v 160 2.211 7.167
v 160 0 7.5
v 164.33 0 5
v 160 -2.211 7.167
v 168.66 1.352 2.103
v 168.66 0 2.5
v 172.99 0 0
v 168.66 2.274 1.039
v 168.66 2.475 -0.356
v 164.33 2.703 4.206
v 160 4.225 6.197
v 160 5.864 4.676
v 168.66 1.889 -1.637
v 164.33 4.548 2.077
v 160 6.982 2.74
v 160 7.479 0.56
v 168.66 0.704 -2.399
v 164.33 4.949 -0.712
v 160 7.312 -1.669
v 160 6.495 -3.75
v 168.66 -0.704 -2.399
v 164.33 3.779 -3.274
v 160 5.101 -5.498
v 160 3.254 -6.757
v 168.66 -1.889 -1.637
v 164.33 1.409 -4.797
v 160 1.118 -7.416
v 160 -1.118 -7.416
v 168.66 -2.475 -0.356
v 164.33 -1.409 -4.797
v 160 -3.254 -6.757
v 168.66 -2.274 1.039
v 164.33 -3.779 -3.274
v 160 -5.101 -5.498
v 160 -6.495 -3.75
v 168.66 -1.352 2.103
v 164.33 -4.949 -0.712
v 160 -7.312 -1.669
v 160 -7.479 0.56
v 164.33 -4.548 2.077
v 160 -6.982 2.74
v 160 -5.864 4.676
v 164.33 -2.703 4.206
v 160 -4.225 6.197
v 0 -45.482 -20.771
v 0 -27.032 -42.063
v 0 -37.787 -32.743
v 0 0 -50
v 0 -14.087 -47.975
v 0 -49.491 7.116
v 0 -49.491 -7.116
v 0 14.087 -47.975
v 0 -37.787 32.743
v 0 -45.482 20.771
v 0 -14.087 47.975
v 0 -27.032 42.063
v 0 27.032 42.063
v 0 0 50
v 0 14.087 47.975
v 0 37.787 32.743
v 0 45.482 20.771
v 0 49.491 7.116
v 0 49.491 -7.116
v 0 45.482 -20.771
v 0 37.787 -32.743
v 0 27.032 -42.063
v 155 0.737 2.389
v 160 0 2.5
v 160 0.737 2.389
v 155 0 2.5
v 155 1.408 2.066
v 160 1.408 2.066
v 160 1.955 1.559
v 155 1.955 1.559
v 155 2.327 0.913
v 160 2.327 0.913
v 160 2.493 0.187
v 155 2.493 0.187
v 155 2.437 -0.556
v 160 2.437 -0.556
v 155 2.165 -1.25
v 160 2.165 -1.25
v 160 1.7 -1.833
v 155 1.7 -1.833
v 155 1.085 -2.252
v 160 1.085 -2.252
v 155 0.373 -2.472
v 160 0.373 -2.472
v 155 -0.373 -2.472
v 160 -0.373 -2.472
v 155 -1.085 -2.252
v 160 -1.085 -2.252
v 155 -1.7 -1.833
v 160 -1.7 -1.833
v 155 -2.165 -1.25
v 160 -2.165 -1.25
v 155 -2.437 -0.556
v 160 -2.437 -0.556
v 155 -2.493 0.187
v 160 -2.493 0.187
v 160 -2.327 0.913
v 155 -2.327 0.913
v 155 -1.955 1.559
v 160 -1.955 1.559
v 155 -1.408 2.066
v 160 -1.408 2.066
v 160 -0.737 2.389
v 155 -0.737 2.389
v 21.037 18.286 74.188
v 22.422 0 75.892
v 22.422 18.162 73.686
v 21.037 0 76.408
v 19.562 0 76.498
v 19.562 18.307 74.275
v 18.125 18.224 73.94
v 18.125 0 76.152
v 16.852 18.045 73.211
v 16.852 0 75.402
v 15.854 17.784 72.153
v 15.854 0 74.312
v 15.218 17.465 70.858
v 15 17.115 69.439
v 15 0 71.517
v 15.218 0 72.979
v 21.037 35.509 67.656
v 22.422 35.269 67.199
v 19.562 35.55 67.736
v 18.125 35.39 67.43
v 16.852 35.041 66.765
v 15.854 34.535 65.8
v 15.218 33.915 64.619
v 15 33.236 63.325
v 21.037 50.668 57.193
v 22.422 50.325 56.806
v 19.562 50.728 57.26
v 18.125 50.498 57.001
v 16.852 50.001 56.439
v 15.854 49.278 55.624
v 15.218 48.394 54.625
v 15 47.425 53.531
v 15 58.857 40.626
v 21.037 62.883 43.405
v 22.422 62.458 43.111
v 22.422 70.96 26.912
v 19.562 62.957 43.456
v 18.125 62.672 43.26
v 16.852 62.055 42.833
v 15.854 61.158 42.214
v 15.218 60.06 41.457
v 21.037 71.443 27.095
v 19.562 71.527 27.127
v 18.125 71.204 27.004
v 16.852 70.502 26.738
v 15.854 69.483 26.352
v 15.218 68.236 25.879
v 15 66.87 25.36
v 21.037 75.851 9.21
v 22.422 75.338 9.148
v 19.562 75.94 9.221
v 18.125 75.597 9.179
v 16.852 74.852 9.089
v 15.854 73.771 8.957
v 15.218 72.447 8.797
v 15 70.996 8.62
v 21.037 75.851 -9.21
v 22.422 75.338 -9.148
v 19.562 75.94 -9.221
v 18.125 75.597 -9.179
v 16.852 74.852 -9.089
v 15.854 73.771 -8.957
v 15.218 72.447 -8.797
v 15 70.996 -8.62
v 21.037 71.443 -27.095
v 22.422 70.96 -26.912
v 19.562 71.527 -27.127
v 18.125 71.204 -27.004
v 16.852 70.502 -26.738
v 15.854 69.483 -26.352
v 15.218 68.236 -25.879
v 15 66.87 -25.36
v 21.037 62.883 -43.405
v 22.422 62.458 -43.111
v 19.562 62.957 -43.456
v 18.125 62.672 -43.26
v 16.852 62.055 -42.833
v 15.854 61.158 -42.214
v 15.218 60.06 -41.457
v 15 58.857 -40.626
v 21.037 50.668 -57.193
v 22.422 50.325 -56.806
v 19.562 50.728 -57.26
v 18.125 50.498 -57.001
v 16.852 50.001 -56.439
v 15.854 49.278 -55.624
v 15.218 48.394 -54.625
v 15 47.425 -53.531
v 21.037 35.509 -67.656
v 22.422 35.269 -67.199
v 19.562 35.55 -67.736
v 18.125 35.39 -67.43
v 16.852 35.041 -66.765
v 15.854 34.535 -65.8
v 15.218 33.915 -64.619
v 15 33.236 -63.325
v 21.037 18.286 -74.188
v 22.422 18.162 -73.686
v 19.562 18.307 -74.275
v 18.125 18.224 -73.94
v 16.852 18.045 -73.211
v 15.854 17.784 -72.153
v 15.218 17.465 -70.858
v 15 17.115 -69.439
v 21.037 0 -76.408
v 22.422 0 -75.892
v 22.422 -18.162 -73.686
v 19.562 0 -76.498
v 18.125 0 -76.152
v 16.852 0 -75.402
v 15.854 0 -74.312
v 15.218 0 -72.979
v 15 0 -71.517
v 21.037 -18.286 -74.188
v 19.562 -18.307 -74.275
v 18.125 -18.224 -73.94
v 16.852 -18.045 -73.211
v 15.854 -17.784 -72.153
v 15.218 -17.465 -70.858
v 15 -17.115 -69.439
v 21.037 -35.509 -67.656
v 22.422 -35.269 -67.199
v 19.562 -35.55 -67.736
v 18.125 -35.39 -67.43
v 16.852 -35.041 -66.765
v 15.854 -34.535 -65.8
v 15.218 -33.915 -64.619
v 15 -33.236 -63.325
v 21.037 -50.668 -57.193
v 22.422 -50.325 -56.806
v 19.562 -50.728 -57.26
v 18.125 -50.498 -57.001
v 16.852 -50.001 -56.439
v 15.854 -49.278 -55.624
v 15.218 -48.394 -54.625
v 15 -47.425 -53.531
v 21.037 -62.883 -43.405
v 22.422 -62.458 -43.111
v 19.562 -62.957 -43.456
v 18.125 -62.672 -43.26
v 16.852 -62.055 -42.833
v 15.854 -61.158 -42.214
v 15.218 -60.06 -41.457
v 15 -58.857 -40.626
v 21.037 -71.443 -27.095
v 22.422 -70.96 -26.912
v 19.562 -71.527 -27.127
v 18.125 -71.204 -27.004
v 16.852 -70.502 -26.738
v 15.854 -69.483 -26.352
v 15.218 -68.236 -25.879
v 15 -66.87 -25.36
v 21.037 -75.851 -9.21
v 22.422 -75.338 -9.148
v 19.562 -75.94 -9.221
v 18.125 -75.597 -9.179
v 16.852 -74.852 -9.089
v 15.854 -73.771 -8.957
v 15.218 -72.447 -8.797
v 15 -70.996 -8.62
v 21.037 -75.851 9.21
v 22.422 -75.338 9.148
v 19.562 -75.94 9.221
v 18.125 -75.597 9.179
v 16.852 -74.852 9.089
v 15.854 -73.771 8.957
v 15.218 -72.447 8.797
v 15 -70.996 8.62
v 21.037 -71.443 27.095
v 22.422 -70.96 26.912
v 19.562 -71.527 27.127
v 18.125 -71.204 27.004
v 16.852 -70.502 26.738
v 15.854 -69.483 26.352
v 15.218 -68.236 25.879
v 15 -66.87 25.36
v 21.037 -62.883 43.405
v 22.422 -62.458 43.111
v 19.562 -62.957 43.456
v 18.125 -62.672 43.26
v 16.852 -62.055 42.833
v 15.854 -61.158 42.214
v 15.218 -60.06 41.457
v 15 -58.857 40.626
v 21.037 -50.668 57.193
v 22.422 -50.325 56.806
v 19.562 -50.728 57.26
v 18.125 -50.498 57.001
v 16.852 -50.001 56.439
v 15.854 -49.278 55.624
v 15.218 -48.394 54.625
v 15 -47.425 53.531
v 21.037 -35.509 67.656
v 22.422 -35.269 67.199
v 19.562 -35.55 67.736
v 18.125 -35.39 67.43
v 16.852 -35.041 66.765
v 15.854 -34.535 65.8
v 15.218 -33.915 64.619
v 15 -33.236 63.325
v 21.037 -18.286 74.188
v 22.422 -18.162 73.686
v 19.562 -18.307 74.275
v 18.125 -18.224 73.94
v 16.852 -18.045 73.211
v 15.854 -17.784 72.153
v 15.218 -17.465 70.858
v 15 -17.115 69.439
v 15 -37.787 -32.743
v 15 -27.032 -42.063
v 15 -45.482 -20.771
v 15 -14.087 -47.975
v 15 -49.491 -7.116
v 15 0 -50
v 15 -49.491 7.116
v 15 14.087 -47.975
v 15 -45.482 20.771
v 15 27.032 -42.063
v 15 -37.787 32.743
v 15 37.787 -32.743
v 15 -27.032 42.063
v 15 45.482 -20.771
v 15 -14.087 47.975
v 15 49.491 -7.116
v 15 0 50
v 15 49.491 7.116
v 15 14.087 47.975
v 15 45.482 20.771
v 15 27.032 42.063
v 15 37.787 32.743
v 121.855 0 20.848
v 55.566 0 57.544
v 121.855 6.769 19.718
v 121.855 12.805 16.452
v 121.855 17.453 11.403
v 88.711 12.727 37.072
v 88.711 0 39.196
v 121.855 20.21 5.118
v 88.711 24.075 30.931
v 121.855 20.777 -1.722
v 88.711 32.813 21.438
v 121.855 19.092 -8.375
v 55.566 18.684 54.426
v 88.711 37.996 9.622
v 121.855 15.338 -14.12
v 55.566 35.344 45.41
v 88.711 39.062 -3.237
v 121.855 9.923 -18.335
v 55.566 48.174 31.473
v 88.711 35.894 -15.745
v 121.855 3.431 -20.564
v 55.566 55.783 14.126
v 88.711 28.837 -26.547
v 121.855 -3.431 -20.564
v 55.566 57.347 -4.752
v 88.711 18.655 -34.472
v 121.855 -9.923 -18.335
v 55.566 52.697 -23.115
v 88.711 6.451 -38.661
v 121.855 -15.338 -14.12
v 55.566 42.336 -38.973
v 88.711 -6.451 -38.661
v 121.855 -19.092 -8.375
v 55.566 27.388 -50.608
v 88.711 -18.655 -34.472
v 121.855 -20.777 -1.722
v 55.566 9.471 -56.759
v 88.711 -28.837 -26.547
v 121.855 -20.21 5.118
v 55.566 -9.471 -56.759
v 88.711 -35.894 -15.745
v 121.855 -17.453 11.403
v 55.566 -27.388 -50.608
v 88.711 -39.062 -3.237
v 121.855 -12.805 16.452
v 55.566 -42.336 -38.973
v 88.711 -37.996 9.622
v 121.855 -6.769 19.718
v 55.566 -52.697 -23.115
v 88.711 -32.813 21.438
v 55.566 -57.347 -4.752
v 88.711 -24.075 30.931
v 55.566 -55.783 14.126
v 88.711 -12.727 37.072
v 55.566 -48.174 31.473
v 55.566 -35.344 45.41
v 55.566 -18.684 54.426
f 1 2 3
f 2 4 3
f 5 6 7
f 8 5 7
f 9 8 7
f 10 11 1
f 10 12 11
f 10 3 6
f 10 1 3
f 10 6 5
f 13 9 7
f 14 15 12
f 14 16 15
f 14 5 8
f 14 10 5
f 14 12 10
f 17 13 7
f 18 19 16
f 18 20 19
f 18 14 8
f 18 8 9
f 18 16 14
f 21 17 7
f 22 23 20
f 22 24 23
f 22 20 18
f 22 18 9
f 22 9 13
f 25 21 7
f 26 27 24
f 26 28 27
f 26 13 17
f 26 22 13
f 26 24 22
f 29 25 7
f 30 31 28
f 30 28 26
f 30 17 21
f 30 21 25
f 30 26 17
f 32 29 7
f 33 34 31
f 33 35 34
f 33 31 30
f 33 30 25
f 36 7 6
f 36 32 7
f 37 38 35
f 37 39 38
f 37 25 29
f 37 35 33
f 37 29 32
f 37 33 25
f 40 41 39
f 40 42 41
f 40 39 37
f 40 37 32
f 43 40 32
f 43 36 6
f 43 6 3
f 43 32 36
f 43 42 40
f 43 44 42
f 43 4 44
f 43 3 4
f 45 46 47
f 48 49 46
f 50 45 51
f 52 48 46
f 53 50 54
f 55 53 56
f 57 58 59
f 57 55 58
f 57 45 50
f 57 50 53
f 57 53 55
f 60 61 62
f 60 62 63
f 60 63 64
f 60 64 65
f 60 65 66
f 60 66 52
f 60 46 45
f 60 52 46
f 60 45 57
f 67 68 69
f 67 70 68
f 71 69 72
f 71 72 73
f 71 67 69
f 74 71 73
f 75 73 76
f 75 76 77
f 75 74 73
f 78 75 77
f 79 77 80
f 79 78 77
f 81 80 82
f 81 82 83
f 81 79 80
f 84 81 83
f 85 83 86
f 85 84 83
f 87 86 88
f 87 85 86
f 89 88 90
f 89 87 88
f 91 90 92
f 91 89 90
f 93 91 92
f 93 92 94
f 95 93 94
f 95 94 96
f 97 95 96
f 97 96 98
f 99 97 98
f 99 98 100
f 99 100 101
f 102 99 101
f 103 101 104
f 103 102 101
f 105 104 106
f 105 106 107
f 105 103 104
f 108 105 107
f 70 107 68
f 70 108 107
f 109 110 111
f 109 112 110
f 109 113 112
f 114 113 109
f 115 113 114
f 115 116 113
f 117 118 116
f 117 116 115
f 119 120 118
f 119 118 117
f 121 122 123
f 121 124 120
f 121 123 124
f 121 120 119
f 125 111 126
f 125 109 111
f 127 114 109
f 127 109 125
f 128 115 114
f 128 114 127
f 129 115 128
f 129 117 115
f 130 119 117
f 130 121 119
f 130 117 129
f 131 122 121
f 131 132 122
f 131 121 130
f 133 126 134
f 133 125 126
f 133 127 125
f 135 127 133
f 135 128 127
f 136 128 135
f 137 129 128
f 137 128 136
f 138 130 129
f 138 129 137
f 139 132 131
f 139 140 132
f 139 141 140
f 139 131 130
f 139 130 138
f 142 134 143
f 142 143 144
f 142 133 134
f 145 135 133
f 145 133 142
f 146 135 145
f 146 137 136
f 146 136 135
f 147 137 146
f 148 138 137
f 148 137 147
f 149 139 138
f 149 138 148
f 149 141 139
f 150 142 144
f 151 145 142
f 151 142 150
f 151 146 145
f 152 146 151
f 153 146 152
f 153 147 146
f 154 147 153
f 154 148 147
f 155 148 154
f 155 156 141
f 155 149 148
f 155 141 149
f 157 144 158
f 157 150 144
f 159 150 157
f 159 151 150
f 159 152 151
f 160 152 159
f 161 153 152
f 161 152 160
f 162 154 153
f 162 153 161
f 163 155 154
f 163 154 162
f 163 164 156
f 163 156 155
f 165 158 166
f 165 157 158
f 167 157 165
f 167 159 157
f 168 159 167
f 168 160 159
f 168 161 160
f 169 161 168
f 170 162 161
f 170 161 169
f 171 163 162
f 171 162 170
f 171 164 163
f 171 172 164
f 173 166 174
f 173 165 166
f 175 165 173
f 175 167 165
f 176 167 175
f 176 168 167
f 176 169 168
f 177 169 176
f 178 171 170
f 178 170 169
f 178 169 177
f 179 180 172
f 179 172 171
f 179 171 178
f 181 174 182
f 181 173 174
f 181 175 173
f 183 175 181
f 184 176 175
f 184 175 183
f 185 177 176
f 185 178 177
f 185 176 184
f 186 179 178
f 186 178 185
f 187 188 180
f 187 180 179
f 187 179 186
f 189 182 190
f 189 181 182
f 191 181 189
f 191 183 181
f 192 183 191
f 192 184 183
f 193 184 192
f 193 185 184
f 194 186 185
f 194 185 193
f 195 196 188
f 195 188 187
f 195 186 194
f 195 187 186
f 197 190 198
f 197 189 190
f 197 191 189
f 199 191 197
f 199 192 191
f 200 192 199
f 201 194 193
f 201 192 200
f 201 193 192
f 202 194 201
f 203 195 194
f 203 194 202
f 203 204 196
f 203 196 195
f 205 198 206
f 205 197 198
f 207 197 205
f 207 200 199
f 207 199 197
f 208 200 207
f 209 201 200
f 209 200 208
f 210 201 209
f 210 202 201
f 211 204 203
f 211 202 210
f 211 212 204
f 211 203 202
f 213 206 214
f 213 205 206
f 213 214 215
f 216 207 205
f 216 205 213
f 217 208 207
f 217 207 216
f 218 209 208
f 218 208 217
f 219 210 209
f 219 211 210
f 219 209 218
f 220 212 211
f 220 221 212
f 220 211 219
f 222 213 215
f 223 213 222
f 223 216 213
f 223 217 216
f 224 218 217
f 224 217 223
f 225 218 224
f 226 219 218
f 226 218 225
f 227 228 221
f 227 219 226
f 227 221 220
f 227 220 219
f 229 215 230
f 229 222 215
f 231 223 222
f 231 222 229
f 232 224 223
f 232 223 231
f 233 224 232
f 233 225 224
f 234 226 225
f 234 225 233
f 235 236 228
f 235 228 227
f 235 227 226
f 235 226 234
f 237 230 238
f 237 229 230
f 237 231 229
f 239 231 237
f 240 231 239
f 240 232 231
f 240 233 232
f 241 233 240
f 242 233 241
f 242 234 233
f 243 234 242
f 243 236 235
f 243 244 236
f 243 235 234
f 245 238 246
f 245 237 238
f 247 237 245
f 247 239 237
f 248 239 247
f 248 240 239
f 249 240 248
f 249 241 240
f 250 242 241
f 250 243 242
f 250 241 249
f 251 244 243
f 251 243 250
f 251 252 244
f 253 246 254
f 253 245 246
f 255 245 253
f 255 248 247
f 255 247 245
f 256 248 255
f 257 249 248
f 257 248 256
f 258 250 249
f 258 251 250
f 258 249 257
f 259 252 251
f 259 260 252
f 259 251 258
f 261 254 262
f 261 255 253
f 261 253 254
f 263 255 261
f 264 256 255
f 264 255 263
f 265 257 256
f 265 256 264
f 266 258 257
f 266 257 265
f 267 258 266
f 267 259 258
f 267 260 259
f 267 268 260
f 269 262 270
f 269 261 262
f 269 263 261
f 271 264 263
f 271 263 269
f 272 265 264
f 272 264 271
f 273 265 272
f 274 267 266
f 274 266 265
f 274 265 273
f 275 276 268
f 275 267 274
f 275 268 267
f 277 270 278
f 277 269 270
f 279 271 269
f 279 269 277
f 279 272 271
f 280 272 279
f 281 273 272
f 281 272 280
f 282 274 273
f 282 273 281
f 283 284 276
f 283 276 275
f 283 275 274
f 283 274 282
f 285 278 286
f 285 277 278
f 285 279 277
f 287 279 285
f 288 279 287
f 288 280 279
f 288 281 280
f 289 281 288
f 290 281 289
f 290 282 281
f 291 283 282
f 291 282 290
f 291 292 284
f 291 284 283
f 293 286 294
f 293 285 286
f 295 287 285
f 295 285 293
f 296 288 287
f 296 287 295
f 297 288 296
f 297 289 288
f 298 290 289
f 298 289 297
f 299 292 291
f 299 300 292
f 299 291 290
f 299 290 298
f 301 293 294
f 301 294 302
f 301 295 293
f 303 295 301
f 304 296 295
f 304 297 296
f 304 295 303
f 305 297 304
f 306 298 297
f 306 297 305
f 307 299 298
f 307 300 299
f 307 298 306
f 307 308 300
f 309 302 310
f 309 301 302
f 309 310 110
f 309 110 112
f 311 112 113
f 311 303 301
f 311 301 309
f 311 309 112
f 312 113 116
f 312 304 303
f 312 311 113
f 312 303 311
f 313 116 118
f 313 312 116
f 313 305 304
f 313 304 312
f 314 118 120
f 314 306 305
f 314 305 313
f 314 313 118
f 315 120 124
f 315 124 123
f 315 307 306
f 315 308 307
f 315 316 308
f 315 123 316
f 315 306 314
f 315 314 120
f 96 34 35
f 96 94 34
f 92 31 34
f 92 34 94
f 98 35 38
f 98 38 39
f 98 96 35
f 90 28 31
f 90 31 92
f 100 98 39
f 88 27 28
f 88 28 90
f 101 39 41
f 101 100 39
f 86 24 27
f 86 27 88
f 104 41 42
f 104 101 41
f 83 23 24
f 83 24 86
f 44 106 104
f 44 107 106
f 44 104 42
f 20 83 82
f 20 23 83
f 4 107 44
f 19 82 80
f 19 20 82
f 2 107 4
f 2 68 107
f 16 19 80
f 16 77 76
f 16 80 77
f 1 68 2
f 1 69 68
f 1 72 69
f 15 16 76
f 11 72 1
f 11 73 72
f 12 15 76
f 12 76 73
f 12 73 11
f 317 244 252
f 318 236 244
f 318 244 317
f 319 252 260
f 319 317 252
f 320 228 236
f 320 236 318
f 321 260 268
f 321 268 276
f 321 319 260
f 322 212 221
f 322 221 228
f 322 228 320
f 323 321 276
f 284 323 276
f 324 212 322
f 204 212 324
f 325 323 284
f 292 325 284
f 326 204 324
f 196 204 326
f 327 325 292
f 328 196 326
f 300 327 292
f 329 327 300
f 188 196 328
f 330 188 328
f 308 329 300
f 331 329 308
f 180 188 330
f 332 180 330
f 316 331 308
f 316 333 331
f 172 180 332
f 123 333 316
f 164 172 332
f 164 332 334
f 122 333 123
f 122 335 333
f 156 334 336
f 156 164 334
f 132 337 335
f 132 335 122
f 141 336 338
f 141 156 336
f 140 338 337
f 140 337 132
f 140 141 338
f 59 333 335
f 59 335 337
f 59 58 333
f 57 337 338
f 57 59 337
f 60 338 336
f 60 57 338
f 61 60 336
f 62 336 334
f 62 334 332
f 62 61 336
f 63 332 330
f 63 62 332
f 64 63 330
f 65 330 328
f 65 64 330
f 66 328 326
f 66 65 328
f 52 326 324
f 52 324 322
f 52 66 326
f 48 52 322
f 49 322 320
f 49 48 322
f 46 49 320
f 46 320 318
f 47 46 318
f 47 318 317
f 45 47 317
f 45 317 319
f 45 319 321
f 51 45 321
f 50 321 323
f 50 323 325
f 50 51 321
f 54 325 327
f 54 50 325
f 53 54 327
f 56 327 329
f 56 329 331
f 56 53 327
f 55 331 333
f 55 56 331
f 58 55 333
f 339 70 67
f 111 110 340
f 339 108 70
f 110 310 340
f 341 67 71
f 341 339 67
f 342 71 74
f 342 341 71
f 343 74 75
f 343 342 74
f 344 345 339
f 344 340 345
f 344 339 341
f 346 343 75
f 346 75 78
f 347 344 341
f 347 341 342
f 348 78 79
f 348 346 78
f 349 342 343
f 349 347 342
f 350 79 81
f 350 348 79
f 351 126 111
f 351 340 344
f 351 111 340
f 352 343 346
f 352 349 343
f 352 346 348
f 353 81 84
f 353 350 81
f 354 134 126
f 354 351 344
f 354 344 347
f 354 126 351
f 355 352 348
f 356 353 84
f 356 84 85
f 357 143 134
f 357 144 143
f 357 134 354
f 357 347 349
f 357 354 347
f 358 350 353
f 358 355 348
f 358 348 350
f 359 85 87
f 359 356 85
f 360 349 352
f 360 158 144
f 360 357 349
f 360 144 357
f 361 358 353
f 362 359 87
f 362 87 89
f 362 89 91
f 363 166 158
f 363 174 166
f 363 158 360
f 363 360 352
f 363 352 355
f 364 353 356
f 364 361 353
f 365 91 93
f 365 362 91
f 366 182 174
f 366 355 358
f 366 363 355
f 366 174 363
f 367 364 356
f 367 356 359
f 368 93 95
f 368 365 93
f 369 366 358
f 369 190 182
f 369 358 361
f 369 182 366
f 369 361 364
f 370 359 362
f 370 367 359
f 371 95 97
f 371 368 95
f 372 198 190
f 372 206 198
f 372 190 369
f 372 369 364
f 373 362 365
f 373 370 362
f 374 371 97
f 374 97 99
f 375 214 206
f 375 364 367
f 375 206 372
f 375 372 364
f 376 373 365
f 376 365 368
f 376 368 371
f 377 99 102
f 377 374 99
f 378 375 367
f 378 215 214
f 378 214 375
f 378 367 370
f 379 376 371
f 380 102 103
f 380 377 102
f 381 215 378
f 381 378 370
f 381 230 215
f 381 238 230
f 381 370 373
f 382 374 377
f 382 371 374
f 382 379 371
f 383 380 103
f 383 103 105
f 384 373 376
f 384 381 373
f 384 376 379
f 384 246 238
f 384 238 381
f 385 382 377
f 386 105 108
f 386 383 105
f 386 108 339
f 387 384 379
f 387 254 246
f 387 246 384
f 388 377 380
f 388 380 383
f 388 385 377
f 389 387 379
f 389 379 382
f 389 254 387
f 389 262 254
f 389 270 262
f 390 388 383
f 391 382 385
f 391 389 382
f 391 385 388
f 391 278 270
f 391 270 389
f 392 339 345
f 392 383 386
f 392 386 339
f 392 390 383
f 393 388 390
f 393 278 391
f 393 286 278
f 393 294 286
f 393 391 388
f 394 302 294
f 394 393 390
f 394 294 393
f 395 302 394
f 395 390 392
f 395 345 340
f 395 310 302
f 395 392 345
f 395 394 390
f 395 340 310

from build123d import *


with BuildPart() as f1:
    # F0 (on Front) → F1 (revolve)
    with BuildSketch(Plane.XZ):
        with BuildLine():
            Line((0, 50), (0, 0))
            Line((0, 0), (172.990381, 0))
            Line((172.990381, 0), (160, 7.5))
            Line((160, 7.5), (160, 2.5))
            Line((160, 2.5), (155, 2.5))
            Line((155, 2.5), (22.421579, 75.891626))
            ThreePointArc((22.421579, 75.891626), (17.461092, 75.824589), (15, 71.51716))
            Line((15, 71.51716), (15, 50))
            Line((15, 50), (0, 50))
        make_face()
    revolve(axis=Axis((-26.037737, 0, 0), (-1, 0, 0)))


solid = f1.part
